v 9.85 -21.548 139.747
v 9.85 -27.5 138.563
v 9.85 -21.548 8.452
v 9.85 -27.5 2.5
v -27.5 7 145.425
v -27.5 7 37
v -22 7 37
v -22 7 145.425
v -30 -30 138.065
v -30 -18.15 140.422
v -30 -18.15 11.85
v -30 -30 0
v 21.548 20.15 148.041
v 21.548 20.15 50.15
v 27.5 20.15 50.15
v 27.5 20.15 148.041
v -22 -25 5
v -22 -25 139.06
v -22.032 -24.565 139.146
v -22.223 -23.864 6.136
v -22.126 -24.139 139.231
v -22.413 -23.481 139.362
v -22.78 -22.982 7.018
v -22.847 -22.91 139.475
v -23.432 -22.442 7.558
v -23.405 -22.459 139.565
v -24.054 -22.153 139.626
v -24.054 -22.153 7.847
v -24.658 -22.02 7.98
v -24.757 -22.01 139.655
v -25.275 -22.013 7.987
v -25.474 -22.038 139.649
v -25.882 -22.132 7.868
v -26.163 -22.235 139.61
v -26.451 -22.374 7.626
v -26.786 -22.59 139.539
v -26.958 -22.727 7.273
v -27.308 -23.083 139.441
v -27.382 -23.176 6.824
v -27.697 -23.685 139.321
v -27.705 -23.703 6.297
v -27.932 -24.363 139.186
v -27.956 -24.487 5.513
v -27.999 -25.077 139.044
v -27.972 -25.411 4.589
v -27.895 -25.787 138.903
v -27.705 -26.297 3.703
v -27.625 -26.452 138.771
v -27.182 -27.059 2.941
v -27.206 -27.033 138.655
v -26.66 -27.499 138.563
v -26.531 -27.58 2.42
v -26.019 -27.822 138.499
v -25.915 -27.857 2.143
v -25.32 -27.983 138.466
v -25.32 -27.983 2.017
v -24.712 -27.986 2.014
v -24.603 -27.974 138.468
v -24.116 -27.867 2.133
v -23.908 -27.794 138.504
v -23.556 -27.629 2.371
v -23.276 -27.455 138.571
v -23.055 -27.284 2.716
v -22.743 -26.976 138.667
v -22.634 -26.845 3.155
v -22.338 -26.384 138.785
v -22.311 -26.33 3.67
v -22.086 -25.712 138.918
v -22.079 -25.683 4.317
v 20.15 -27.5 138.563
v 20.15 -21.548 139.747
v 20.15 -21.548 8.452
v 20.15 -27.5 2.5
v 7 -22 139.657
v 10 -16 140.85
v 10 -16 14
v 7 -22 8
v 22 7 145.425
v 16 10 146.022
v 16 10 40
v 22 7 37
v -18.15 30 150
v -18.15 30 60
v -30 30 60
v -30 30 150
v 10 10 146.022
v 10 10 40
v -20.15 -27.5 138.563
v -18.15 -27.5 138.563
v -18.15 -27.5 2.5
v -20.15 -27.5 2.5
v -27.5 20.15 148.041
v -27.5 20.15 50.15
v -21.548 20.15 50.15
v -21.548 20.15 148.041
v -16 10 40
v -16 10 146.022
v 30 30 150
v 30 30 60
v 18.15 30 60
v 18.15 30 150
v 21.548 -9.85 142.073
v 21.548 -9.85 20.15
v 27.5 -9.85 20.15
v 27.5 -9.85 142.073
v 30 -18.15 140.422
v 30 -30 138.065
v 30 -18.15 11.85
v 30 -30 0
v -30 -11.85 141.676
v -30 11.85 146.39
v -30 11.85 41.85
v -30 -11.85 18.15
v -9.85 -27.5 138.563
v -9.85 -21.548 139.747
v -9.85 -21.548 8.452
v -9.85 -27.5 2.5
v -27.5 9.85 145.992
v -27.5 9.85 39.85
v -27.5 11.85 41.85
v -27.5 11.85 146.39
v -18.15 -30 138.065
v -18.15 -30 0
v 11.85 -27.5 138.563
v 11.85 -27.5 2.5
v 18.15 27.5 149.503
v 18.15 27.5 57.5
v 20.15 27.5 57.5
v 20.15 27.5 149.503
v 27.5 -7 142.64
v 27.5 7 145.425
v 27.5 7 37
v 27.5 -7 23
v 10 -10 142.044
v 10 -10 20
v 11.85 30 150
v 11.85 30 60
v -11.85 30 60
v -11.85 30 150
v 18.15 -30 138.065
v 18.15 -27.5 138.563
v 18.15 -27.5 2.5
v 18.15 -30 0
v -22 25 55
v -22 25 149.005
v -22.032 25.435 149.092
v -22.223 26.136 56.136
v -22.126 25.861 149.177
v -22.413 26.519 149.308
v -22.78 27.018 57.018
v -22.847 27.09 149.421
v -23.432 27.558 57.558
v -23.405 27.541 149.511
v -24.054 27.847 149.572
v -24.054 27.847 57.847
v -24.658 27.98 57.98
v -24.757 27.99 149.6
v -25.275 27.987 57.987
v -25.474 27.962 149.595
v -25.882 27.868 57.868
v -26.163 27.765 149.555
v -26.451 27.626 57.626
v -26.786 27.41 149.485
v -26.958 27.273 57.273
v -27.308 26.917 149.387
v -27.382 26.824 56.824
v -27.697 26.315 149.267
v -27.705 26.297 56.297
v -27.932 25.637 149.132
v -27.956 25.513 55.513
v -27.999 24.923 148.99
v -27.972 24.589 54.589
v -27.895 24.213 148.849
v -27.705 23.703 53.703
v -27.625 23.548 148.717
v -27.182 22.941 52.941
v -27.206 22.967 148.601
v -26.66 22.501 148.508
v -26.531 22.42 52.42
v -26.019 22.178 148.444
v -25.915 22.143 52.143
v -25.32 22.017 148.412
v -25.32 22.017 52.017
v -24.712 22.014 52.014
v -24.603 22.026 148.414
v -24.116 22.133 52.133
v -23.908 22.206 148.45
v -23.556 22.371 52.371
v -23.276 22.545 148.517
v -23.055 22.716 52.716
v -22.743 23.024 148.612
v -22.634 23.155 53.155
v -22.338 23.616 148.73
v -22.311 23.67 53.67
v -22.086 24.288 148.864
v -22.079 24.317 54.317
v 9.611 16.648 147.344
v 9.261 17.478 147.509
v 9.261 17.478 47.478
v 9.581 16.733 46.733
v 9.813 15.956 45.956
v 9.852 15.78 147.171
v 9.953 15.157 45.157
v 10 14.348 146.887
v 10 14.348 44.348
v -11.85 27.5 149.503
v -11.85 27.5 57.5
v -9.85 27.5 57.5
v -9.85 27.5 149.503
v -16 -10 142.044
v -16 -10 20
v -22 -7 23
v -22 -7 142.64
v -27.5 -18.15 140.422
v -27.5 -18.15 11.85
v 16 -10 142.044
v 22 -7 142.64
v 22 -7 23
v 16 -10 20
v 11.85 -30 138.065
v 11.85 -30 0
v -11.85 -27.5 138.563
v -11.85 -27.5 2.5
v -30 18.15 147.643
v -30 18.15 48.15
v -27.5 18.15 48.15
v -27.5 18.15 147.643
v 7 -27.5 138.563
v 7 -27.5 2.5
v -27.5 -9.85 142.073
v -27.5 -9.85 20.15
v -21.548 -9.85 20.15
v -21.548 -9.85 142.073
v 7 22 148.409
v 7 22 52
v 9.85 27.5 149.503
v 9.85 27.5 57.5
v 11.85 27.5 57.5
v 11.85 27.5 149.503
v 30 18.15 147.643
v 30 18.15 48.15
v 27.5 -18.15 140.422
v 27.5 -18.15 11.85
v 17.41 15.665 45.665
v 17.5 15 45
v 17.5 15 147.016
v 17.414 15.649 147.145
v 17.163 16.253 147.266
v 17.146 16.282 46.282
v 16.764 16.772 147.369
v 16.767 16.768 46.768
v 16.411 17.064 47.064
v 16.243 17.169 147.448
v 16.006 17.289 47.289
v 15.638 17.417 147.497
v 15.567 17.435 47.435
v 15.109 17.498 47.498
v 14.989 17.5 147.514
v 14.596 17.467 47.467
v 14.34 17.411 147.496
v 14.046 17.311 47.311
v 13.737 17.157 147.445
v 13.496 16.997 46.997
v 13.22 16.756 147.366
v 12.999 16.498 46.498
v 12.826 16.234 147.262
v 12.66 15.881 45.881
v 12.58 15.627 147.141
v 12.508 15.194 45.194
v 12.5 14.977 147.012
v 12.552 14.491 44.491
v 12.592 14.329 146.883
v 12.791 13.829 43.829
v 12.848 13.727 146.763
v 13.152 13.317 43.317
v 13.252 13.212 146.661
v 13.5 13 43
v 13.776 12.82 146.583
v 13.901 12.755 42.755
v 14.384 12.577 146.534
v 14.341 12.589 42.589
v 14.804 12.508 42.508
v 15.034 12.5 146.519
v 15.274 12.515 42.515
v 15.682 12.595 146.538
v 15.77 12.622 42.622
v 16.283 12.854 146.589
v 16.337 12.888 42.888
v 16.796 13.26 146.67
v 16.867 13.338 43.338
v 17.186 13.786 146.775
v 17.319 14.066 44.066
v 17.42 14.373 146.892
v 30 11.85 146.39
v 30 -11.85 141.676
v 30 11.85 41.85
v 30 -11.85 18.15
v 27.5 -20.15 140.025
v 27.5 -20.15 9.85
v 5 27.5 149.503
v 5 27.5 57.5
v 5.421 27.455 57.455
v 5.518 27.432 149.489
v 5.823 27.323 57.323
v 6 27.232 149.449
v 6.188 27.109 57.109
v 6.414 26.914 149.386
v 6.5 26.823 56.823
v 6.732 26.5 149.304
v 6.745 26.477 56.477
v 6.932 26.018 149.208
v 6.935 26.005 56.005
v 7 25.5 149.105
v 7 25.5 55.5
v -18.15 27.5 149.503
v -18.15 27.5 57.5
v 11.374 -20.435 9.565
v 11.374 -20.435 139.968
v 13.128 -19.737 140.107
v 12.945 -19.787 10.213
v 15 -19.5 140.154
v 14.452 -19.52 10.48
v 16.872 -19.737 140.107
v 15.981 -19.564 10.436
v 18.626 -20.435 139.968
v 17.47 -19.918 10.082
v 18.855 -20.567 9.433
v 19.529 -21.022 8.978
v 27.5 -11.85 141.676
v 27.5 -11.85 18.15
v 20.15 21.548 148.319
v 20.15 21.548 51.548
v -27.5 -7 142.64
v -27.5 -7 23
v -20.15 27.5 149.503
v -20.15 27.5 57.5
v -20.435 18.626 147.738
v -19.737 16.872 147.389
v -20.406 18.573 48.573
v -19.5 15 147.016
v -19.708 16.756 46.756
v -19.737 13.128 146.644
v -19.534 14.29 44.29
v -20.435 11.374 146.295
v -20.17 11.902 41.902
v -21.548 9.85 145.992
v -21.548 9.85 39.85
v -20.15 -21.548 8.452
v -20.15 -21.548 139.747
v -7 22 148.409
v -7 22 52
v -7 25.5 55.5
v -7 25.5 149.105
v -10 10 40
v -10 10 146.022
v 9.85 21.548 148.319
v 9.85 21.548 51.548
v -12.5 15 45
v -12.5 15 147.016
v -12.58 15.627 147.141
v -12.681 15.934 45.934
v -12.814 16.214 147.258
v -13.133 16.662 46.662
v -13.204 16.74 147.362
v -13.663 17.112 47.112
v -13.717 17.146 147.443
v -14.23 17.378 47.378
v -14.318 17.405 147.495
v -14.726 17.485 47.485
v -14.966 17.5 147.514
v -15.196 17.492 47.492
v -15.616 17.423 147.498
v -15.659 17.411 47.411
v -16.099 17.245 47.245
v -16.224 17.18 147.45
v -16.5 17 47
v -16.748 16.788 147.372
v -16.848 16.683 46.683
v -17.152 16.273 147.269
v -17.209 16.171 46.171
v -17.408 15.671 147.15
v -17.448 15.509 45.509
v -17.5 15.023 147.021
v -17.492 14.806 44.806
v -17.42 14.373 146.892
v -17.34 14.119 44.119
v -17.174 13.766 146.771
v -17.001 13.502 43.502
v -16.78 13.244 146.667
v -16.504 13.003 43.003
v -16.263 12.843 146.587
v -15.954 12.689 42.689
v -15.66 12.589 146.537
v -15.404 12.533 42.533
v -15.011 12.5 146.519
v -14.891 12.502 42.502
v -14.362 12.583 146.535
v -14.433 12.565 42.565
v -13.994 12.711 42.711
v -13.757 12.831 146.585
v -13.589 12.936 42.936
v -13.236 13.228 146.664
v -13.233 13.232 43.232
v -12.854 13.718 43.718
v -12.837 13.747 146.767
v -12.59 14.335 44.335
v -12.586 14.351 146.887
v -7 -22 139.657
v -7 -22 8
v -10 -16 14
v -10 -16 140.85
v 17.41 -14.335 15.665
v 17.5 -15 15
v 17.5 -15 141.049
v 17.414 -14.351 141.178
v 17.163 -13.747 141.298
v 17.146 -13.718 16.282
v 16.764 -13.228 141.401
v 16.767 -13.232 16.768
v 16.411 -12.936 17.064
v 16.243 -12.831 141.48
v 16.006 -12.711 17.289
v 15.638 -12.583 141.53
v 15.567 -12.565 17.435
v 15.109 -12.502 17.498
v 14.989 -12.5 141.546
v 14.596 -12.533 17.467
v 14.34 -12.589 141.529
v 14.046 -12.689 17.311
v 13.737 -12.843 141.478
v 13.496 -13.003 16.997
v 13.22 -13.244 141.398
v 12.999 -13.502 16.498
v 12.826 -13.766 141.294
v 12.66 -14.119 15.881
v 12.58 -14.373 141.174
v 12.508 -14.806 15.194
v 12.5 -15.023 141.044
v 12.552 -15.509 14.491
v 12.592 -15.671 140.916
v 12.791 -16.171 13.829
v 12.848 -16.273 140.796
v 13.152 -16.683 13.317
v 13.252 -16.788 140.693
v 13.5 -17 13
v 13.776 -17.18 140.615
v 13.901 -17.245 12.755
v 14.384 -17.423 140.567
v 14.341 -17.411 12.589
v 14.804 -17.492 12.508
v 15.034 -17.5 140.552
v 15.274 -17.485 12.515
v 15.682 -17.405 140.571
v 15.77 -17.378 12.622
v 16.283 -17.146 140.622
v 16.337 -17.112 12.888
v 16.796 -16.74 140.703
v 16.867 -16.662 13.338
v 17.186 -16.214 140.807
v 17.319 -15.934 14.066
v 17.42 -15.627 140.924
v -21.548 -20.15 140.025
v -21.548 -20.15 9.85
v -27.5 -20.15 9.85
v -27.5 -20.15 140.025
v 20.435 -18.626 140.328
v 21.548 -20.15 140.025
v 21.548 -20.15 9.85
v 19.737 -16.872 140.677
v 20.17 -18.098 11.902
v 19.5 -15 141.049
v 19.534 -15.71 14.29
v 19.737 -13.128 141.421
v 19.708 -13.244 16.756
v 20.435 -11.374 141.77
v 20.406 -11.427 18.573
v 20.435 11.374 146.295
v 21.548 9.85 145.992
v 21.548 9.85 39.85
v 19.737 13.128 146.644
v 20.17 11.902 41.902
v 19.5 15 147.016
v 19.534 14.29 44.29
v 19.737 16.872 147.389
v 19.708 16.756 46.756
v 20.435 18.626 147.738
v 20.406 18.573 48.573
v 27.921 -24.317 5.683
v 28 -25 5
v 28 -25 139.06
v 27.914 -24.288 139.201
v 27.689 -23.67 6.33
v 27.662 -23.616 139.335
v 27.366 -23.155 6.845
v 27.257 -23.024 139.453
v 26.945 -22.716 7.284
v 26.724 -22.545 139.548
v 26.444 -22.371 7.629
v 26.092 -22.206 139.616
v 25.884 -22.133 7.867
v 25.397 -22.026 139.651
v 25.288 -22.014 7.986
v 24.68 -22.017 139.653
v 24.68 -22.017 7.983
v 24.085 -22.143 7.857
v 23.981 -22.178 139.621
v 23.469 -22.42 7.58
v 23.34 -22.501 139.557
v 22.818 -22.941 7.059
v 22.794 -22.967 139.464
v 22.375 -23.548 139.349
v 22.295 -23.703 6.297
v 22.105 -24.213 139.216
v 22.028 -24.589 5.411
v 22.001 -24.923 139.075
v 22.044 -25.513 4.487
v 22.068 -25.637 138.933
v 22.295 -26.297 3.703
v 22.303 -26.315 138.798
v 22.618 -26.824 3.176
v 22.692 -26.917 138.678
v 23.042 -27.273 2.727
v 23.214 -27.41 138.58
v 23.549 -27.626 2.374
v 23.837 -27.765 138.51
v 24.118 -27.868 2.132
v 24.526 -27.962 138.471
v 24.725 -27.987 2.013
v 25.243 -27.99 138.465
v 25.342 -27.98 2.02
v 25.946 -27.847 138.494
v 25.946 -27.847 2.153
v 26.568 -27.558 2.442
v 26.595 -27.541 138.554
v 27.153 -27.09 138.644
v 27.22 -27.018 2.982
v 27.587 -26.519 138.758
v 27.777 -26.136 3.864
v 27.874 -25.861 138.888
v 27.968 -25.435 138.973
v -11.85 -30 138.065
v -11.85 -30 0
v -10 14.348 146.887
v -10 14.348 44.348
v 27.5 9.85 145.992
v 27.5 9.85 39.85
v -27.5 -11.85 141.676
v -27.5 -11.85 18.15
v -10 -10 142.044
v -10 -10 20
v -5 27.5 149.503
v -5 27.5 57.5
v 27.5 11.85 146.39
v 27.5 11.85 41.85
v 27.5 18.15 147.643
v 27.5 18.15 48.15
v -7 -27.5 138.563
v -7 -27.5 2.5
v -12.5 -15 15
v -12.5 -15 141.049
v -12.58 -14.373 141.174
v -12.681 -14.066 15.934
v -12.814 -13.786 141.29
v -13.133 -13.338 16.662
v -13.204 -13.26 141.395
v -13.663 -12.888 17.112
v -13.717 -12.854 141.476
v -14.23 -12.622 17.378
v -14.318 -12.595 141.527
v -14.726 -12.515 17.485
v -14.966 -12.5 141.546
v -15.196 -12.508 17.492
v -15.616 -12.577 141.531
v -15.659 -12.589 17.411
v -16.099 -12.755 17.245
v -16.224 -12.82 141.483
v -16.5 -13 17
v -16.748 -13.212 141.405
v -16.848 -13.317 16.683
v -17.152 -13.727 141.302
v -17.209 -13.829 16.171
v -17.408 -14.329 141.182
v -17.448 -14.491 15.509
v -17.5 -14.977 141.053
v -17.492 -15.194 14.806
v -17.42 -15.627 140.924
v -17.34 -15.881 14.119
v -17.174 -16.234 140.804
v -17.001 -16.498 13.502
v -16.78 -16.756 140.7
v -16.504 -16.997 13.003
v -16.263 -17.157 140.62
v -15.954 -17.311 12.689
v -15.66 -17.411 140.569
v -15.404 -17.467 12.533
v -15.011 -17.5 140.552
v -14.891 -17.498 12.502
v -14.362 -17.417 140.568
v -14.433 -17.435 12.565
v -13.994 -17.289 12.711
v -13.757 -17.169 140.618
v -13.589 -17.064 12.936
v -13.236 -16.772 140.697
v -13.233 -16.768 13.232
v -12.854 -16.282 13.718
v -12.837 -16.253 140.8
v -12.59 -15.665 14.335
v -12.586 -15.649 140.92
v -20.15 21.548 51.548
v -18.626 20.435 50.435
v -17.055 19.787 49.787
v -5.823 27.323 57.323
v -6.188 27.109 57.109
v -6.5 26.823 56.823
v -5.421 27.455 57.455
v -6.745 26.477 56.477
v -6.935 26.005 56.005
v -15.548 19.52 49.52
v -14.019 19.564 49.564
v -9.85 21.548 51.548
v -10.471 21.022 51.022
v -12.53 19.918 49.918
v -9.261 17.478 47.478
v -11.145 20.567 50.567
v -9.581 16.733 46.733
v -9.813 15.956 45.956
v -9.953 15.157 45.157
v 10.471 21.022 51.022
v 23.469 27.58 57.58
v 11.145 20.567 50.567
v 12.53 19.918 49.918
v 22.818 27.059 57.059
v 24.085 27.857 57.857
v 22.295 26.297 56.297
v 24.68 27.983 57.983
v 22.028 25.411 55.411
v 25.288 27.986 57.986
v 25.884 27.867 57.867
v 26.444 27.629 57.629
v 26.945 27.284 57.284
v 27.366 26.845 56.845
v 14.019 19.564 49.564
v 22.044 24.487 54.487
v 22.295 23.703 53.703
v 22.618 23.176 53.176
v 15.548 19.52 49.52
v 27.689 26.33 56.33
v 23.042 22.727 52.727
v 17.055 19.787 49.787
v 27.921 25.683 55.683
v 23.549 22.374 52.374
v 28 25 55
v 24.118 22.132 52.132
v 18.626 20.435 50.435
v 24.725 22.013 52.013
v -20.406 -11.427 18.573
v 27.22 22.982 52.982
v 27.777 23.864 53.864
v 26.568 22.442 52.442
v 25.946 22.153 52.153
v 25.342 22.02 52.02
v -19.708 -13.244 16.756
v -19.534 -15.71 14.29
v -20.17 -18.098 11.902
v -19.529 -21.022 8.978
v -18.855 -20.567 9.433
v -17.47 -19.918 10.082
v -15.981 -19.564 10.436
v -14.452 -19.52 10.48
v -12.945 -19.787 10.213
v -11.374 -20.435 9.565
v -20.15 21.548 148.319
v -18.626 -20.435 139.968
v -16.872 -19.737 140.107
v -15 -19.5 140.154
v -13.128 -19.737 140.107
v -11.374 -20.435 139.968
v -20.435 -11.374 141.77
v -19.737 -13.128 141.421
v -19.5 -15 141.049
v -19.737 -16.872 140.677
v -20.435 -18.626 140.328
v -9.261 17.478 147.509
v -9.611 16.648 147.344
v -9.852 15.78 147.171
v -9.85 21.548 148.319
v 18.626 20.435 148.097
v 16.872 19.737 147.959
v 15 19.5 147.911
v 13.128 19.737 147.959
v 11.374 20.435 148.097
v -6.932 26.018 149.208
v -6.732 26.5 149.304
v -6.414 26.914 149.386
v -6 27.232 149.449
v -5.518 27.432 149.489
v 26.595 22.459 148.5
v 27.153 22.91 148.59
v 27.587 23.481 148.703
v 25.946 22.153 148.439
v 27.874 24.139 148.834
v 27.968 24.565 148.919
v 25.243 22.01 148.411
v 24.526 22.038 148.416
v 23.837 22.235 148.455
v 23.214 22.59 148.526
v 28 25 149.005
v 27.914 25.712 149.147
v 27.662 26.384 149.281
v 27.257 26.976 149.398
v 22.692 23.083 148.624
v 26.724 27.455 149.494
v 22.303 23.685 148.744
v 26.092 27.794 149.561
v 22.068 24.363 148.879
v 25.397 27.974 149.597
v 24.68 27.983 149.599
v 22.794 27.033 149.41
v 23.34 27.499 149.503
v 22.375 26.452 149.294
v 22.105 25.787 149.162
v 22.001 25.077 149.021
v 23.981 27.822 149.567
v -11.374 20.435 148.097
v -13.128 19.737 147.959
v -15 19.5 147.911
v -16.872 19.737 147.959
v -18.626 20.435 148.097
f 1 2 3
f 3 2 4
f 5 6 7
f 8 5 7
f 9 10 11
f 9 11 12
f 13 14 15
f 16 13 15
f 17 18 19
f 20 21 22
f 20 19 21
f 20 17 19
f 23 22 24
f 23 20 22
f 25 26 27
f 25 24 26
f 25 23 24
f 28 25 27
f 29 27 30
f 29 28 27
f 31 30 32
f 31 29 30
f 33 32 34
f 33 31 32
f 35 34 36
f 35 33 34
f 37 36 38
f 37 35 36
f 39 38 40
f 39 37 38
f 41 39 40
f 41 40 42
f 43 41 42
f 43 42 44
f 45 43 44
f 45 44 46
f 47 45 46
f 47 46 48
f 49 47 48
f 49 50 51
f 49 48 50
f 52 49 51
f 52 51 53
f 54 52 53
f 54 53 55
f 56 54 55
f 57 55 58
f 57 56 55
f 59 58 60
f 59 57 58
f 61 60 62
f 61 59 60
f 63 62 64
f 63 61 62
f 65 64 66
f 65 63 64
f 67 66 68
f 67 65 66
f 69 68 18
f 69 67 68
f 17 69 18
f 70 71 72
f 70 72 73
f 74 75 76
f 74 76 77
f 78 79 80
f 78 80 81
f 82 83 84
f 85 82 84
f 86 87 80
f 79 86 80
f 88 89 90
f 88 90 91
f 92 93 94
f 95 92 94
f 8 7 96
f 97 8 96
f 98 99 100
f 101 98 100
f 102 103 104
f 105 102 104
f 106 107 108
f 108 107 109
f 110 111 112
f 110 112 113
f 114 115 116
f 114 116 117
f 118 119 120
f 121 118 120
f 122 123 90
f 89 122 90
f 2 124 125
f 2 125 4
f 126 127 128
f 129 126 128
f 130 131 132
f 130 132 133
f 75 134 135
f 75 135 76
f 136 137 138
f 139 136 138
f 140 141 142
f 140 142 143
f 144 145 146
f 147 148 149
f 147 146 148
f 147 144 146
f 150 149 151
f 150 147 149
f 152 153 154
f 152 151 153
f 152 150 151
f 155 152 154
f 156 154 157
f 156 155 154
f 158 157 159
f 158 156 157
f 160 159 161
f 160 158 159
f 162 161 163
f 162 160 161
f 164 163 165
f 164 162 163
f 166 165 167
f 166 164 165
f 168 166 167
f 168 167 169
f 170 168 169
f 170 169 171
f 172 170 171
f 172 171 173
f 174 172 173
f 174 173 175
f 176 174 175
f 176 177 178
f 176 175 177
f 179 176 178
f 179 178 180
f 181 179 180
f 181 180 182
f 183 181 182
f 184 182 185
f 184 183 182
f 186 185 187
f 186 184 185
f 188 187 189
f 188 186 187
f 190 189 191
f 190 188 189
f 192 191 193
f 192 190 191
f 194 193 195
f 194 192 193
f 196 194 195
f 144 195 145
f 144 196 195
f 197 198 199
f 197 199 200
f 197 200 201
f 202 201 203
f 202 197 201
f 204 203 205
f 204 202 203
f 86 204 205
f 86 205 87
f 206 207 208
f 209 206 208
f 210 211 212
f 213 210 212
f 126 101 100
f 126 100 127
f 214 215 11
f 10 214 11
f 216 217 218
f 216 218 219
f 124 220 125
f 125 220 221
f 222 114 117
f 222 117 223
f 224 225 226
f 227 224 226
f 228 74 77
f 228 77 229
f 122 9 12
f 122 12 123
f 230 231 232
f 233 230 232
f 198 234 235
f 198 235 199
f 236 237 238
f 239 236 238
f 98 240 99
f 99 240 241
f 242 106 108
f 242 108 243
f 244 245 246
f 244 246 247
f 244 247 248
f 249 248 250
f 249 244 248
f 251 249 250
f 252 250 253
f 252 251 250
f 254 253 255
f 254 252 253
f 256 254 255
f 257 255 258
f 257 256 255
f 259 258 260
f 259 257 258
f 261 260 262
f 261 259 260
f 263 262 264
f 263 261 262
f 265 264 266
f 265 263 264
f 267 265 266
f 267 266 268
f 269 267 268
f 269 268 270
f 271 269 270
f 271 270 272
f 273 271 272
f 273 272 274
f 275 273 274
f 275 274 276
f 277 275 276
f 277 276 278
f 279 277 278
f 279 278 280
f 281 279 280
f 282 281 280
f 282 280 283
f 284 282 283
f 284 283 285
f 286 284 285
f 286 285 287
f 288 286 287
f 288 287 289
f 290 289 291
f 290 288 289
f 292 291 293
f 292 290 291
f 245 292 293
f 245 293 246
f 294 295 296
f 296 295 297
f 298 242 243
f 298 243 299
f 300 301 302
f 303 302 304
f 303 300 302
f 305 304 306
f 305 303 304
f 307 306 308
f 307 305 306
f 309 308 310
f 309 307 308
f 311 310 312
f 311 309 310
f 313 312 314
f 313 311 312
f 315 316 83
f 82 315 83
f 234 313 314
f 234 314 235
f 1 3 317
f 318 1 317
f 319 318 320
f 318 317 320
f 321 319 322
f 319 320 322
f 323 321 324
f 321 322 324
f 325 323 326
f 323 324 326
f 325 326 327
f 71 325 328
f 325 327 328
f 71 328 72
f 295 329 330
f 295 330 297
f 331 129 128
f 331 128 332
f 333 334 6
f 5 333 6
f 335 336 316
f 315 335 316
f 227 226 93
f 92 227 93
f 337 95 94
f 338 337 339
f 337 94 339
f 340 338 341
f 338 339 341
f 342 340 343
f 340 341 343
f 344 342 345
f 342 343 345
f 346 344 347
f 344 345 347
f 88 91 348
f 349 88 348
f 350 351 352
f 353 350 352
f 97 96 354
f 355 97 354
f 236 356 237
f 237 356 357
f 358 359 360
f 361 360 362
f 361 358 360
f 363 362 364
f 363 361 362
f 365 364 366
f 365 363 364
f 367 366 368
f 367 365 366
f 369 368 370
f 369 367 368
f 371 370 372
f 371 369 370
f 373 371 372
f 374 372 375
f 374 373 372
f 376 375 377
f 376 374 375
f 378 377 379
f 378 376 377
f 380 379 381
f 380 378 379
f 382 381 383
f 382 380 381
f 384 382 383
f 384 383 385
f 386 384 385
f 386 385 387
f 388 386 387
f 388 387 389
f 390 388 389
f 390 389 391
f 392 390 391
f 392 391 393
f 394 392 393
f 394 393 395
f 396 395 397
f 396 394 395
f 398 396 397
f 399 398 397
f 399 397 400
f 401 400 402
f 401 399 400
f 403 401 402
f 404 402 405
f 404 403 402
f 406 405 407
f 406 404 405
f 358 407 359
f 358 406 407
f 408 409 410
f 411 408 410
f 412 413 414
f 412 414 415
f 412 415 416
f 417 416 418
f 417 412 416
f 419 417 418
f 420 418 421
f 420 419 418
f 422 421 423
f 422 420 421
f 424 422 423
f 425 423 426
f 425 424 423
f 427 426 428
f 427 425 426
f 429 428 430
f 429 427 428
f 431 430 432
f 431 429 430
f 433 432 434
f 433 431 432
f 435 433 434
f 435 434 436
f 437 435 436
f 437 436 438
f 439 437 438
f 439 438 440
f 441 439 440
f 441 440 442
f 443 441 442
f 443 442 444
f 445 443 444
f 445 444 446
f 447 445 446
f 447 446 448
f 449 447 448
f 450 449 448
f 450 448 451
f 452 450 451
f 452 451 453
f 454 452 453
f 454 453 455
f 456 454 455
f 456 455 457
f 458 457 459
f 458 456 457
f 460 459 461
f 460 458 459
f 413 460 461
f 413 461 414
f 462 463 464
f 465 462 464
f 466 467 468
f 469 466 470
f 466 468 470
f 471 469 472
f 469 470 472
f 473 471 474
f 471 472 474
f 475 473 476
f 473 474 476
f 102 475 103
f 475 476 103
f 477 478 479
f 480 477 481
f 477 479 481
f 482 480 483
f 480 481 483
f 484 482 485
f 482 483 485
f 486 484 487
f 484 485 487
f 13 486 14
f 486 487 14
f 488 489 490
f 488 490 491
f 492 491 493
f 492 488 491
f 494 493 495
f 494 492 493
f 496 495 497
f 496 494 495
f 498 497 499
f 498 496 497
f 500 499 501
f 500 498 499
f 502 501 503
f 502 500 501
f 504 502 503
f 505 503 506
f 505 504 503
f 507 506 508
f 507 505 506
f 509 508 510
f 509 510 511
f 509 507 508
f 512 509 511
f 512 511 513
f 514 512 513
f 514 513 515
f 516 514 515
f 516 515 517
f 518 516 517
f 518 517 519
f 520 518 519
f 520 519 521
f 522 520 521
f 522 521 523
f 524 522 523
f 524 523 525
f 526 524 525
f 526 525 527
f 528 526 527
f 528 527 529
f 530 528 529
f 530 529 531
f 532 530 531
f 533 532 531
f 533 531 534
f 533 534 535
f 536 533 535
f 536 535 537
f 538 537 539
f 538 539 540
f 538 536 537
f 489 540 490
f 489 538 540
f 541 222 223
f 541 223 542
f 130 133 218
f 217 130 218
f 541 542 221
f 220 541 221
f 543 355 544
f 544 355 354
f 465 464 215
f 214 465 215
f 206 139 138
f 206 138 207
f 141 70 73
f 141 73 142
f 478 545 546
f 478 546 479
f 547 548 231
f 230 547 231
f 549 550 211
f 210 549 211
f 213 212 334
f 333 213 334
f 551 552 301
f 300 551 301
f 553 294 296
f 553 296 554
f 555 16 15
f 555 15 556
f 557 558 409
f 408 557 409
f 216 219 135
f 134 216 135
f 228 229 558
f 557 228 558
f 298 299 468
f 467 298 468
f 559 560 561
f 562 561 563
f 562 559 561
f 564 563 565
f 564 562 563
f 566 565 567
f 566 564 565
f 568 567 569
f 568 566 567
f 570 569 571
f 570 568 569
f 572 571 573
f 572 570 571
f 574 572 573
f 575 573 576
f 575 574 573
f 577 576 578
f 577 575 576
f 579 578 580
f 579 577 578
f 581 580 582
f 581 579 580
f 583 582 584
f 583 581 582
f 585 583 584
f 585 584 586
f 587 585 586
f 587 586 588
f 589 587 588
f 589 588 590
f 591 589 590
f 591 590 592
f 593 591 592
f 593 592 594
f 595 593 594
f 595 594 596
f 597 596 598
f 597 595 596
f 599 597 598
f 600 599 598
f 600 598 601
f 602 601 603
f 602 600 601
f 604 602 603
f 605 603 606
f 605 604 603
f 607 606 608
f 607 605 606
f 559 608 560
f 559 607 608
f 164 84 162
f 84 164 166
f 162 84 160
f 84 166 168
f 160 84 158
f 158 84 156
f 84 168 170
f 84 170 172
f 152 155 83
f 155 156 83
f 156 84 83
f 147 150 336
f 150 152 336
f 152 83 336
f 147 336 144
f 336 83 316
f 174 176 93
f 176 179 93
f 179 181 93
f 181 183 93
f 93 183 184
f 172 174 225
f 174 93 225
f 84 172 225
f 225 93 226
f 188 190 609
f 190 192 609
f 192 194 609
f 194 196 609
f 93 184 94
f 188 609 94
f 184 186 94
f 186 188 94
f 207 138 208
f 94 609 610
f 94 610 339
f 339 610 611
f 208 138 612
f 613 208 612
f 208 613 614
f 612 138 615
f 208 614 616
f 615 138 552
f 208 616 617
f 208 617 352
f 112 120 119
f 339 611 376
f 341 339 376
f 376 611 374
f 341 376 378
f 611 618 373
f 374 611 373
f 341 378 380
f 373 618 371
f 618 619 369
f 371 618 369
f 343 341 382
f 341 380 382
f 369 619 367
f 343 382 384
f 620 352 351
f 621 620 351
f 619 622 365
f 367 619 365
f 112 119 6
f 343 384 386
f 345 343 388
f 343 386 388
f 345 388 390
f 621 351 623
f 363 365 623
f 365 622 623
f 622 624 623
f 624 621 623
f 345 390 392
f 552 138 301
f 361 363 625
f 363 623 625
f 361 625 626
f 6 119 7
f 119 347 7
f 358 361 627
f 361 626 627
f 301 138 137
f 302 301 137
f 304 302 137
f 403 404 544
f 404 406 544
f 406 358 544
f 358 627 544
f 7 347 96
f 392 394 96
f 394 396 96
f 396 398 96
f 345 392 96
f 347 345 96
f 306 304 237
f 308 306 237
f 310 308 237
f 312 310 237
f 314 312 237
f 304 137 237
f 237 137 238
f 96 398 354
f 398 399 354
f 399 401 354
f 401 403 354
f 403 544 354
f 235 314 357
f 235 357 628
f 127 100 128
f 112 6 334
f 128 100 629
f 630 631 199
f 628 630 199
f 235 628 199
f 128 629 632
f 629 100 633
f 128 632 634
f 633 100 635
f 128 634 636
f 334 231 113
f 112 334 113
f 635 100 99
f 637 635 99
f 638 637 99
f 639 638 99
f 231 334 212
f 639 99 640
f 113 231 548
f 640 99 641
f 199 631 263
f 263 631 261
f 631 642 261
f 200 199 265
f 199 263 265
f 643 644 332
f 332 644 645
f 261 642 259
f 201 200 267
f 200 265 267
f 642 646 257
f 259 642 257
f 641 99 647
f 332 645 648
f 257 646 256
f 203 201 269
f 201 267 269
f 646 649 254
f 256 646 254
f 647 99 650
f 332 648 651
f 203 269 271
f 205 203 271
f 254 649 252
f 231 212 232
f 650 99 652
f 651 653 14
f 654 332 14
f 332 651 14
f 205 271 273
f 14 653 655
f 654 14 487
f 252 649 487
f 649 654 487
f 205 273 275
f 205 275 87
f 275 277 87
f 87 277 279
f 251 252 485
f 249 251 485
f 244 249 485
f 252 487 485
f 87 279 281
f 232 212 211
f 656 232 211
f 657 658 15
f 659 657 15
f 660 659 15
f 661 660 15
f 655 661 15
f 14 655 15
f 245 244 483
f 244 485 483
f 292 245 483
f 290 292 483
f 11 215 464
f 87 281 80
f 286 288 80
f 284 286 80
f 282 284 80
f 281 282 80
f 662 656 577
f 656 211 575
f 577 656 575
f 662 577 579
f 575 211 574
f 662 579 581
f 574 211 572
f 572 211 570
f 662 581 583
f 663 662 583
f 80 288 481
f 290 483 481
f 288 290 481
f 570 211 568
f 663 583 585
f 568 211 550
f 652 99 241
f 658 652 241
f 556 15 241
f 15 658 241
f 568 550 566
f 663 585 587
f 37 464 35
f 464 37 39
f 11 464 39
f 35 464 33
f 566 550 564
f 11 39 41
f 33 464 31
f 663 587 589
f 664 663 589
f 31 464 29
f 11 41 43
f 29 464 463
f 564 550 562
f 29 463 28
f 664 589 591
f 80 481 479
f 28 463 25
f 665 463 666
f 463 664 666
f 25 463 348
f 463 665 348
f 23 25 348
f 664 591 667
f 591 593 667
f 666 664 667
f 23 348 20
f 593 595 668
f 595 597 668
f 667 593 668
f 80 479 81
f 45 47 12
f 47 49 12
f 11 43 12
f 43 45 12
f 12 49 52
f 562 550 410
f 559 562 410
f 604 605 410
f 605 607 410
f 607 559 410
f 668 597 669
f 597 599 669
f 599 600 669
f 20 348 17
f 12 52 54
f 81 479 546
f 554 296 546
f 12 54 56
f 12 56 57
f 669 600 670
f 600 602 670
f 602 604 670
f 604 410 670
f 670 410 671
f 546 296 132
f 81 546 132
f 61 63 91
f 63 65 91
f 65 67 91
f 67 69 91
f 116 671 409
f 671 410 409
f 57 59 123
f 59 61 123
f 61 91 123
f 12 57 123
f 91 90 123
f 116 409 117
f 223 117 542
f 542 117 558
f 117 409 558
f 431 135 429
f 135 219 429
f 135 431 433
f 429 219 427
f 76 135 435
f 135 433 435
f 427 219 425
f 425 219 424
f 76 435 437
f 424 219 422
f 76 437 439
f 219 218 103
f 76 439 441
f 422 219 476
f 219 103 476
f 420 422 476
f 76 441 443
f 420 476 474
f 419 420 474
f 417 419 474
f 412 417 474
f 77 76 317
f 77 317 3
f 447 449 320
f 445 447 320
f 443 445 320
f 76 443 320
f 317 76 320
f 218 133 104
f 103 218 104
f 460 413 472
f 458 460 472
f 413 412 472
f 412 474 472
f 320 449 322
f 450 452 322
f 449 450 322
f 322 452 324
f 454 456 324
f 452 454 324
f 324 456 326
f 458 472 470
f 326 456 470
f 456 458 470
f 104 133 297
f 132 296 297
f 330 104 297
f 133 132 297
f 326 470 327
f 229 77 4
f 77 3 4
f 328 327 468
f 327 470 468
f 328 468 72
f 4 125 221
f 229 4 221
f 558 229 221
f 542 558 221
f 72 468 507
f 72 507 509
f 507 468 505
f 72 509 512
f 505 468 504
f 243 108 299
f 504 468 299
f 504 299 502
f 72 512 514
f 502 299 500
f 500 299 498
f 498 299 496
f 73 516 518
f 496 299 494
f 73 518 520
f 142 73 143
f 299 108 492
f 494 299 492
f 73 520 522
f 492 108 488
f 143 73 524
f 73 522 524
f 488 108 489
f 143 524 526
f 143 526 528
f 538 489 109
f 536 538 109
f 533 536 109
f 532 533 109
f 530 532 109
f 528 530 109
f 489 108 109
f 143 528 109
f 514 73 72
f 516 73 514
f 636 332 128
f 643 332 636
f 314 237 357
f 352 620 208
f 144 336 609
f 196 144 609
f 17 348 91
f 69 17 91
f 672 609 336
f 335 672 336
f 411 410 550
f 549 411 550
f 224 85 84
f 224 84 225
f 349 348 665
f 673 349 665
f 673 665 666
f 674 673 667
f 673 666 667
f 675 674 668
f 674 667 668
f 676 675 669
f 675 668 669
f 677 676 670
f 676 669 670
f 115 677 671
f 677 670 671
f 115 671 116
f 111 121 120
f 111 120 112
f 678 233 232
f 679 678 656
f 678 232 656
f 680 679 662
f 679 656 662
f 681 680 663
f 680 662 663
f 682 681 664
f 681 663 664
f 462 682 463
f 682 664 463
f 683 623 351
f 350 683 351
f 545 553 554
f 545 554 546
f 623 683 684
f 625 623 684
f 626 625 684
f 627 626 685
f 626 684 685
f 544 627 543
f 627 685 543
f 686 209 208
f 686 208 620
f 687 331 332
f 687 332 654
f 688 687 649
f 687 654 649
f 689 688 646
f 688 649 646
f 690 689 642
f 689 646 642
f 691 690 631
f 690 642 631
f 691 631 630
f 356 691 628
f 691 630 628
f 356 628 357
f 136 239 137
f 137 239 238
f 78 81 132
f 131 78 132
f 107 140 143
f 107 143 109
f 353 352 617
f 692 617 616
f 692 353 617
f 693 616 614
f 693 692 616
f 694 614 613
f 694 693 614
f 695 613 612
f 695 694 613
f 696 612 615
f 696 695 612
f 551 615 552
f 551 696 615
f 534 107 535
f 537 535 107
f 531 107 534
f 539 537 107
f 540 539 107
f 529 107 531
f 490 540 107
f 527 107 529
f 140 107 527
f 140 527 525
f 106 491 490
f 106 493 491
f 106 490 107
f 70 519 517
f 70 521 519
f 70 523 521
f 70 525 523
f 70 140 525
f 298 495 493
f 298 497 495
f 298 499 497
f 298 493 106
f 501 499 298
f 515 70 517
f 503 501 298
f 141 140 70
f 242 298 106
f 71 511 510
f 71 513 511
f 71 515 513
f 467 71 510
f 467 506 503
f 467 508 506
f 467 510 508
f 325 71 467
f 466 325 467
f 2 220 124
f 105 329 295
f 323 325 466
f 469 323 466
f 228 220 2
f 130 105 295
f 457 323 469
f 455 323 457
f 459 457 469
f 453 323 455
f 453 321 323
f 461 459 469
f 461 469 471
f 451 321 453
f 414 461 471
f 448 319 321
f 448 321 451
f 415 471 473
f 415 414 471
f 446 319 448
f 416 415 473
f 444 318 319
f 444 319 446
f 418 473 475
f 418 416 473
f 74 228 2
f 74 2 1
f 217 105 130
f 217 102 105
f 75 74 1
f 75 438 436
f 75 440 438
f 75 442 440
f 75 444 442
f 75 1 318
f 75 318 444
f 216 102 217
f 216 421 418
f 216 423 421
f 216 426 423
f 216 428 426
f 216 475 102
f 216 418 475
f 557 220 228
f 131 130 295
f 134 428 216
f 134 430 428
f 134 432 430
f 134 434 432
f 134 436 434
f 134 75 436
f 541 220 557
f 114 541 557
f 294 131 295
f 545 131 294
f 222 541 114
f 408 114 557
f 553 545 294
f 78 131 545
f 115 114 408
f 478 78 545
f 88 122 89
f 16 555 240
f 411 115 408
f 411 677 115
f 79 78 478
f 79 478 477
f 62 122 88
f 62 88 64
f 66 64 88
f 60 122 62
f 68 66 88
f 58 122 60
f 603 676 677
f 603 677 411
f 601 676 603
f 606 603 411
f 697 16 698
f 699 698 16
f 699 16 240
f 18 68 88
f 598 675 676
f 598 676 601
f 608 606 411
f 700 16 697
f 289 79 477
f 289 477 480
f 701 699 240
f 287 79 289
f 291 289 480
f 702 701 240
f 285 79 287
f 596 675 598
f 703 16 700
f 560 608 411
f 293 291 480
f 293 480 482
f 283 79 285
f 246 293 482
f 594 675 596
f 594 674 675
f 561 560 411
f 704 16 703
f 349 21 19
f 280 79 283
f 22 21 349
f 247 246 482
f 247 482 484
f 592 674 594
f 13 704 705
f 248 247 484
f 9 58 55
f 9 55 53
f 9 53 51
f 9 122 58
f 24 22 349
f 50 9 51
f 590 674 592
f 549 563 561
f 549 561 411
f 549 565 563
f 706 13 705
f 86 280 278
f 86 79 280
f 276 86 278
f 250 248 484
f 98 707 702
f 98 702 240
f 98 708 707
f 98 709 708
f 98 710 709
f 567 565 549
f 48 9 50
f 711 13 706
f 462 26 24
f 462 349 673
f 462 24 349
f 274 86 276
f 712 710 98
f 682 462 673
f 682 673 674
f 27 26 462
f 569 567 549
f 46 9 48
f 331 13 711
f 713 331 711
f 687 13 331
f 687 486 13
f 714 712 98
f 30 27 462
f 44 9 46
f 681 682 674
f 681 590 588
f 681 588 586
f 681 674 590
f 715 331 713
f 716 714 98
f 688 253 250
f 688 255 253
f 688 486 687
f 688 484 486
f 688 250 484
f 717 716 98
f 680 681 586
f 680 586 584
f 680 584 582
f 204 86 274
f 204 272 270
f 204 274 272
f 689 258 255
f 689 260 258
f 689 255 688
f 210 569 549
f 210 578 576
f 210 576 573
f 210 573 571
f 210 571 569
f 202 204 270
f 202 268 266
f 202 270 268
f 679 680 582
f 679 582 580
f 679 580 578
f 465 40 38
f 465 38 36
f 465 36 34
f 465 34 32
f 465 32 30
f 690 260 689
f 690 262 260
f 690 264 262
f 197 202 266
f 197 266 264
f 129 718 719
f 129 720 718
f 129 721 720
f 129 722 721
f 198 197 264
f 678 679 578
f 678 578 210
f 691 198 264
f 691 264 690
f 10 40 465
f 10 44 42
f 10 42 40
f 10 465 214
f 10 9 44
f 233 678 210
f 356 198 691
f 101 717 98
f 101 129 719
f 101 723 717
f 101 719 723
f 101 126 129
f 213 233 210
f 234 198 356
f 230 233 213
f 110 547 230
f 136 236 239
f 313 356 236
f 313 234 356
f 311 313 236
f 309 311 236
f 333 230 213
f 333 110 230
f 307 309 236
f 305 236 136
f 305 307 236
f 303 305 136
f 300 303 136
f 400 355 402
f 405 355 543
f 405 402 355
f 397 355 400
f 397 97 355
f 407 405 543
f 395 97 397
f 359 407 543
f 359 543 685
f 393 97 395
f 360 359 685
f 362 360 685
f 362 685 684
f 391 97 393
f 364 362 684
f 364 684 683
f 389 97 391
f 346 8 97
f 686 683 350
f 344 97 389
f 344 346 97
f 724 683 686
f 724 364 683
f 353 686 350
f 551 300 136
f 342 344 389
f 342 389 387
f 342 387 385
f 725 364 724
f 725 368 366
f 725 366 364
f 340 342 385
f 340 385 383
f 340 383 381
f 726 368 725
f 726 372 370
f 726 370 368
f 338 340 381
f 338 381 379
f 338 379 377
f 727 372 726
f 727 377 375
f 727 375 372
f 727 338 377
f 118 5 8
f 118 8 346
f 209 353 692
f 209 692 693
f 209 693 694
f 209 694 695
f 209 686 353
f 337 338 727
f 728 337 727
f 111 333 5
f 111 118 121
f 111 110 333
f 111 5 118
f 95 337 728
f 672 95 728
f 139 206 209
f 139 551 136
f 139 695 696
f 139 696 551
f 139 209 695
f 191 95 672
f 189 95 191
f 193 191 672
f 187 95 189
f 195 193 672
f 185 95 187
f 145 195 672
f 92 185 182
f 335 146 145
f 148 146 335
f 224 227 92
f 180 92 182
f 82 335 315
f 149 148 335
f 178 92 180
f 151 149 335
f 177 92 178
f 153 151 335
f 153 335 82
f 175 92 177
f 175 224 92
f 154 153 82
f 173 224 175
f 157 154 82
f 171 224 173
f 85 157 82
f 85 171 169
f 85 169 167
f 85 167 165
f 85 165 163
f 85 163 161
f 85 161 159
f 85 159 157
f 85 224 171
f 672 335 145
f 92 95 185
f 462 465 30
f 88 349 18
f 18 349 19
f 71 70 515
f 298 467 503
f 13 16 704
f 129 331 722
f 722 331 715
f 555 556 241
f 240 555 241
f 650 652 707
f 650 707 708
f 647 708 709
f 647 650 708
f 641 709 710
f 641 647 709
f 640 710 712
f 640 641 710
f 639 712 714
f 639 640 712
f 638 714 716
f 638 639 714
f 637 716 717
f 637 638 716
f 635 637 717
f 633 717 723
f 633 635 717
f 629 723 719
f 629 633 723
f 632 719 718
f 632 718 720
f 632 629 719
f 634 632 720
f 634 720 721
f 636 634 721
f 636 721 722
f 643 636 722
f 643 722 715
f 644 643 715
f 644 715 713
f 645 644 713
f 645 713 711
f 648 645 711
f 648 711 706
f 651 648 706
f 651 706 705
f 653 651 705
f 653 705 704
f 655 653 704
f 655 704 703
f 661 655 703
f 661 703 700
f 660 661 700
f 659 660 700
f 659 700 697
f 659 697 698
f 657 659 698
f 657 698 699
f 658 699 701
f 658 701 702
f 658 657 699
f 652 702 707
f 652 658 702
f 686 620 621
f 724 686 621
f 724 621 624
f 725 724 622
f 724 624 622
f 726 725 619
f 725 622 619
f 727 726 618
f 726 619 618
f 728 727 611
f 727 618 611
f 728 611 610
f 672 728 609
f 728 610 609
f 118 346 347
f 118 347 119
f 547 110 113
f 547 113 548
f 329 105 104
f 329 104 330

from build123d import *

# Parameters (mm, degrees)
F0_R          = 3
F0_R_2        = 2.5
F1_DEPTH      = 150
F2_R          = 2
F3_R          = 7
F6_DEPTH      = 30
F6_DEPTH_BACK = 30


# Not quite as in the source:
# - a feature names something its author has since deleted; it is built from what else it names


with BuildPart() as f1:
    # F0 (on Top) → F1 (new body)
    with BuildSketch(Plane.XY):
        with BuildLine():
            Line((18.15, -30), (30, -30))
            Line((30, -30), (30, -18.15))
            Line((30, -18.15), (27.5, -18.15))
            Line((27.5, -18.15), (27.5, -20.15))
            Line((27.5, -20.15), (21.5477069044, -20.15))
            ThreePointArc((21.5477069044, -20.15), (19.5, -15), (21.5477069044, -9.85))
            Line((21.5477069044, -9.85), (27.5, -9.85))
            Line((27.5, -9.85), (27.5, -11.85))
            Line((27.5, -11.85), (30, -11.85))
            Line((30, -11.85), (30, 11.85))
            Line((30, 11.85), (27.5, 11.85))
            Line((27.5, 11.85), (27.5, 9.85))
            Line((27.5, 9.85), (21.5477069044, 9.85))
            ThreePointArc((21.5477069044, 9.85), (19.5, 15), (21.5477069044, 20.15))
            Line((21.5477069044, 20.15), (27.5, 20.15))
            Line((27.5, 20.15), (27.5, 18.15))
            Line((27.5, 18.15), (30, 18.15))
            Line((30, 18.15), (30, 30))
            Line((30, 30), (18.15, 30))
            Line((18.15, 30), (18.15, 27.5))
            Line((18.15, 27.5), (20.15, 27.5))
            Line((20.15, 27.5), (20.15, 21.5477069044))
            ThreePointArc((20.15, 21.5477069044), (15, 19.5), (9.85, 21.5477069044))
            Line((9.85, 21.5477069044), (9.85, 27.5))
            Line((9.85, 27.5), (11.85, 27.5))
            Line((11.85, 27.5), (11.85, 30))
            Line((11.85, 30), (-11.85, 30))
            Line((-11.85, 30), (-11.85, 27.5))
            Line((-11.85, 27.5), (-9.85, 27.5))
            Line((-9.85, 27.5), (-9.85, 21.5477069044))
            ThreePointArc((-9.85, 21.5477069044), (-15, 19.5), (-20.15, 21.5477069044))
            Line((-20.15, 21.5477069044), (-20.15, 27.5))
            Line((-20.15, 27.5), (-18.15, 27.5))
            Line((-18.15, 27.5), (-18.15, 30))
            Line((-18.15, 30), (-30, 30))
            Line((-30, 30), (-30, 18.15))
            Line((-30, 18.15), (-27.5, 18.15))
            Line((-27.5, 18.15), (-27.5, 20.15))
            Line((-27.5, 20.15), (-21.5477069044, 20.15))
            ThreePointArc((-21.5477069044, 20.15), (-19.5, 15), (-21.5477069044, 9.85))
            Line((-21.5477069044, 9.85), (-27.5, 9.85))
            Line((-27.5, 9.85), (-27.5, 11.85))
            Line((-27.5, 11.85), (-30, 11.85))
            Line((-30, 11.85), (-30, -11.85))
            Line((-30, -11.85), (-27.5, -11.85))
            Line((-27.5, -11.85), (-27.5, -9.85))
            Line((-27.5, -9.85), (-21.5477069044, -9.85))
            ThreePointArc((-21.5477069044, -9.85), (-19.5, -15), (-21.5477069044, -20.15))
            Line((-21.5477069044, -20.15), (-27.5, -20.15))
            Line((-27.5, -20.15), (-27.5, -18.15))
            Line((-27.5, -18.15), (-30, -18.15))
            Line((-30, -18.15), (-30, -30))
            Line((-30, -30), (-18.15, -30))
            Line((-18.15, -30), (-18.15, -27.5))
            Line((-18.15, -27.5), (-20.15, -27.5))
            Line((-20.15, -27.5), (-20.15, -21.5477069044))
            ThreePointArc((-20.15, -21.5477069044), (-15, -19.5), (-9.85, -21.5477069044))
            Line((-9.85, -21.5477069044), (-9.85, -27.5))
            Line((-9.85, -27.5), (-11.85, -27.5))
            Line((-11.85, -27.5), (-11.85, -30))
            Line((-11.85, -30), (11.85, -30))
            Line((11.85, -30), (11.85, -27.5))
            Line((11.85, -27.5), (9.85, -27.5))
            Line((9.85, -27.5), (9.85, -21.5477069044))
            ThreePointArc((9.85, -21.5477069044), (15, -19.5), (20.15, -21.5477069044))
            Line((20.15, -21.5477069044), (20.15, -27.5))
            Line((20.15, -27.5), (18.15, -27.5))
            Line((18.15, -27.5), (18.15, -30))
        make_face()
        with Locations((-25, -25)):
            Circle(F0_R, mode=Mode.SUBTRACT)
        with Locations((-15, -15)):
            Circle(F0_R_2, mode=Mode.SUBTRACT)
        with Locations((25, -25)):
            Circle(F0_R, mode=Mode.SUBTRACT)
        with Locations((15, -15)):
            Circle(F0_R_2, mode=Mode.SUBTRACT)
        with Locations((-25, 25)):
            Circle(F0_R, mode=Mode.SUBTRACT)
        with Locations((-15, 15)):
            Circle(F0_R_2, mode=Mode.SUBTRACT)
        Polygon((-7, 22), (-7, 27.5), (0, 27.5), (7, 27.5), (7, 22), (10, 16), (10, 10), (16, 10), (22, 7), (27.5, 7), (27.5, 0), (27.5, -7), (22, -7), (16, -10), (10, -10), (10, -16), (7, -22), (7, -27.5), (0, -27.5), (-7, -27.5), (-7, -22), (-10, -16), (-10, -10), (-16, -10), (-22, -7), (-27.5, -7), (-27.5, 0), (-27.5, 7), (-22, 7), (-16, 10), (-10, 10), (-10, 16), align=None, mode=Mode.SUBTRACT)
        with Locations((15, 15)):
            Circle(F0_R_2, mode=Mode.SUBTRACT)
        with Locations((25, 25)):
            Circle(F0_R, mode=Mode.SUBTRACT)
    extrude(amount=F1_DEPTH)

    # F2
    f2_edges = [f1.edges().sort_by_distance(p)[0] for p in [
        (-7, 27.5, 75),
        (7, 27.5, 75),
    ]]
    fillet(f2_edges, radius=F2_R)

    # F3
    f3_edges = [f1.edges().sort_by_distance(p)[0] for p in [
        (-10, 16, 75),
        (10, 16, 75),
    ]]
    fillet(f3_edges, radius=F3_R)

    # F5 (on Right) → F6 (cut, two sides)
    with BuildSketch(Plane.YZ) as f6_sk:
        Polygon((115.2614038106, 44.5196963257), (64.8905500682, 94.8905500682), (-30, 0), (20.3708537424, -50.3708537424), align=None)
        Polygon((30, 150), (10.7683995954, 246.6837842107), (-148.7245392843, 214.9586661578), (-129.4929388797, 118.2748819471), align=None)
    extrude(amount=F6_DEPTH, mode=Mode.SUBTRACT)
    extrude(f6_sk.sketch, amount=-F6_DEPTH_BACK, mode=Mode.SUBTRACT)


solid = f1.part
